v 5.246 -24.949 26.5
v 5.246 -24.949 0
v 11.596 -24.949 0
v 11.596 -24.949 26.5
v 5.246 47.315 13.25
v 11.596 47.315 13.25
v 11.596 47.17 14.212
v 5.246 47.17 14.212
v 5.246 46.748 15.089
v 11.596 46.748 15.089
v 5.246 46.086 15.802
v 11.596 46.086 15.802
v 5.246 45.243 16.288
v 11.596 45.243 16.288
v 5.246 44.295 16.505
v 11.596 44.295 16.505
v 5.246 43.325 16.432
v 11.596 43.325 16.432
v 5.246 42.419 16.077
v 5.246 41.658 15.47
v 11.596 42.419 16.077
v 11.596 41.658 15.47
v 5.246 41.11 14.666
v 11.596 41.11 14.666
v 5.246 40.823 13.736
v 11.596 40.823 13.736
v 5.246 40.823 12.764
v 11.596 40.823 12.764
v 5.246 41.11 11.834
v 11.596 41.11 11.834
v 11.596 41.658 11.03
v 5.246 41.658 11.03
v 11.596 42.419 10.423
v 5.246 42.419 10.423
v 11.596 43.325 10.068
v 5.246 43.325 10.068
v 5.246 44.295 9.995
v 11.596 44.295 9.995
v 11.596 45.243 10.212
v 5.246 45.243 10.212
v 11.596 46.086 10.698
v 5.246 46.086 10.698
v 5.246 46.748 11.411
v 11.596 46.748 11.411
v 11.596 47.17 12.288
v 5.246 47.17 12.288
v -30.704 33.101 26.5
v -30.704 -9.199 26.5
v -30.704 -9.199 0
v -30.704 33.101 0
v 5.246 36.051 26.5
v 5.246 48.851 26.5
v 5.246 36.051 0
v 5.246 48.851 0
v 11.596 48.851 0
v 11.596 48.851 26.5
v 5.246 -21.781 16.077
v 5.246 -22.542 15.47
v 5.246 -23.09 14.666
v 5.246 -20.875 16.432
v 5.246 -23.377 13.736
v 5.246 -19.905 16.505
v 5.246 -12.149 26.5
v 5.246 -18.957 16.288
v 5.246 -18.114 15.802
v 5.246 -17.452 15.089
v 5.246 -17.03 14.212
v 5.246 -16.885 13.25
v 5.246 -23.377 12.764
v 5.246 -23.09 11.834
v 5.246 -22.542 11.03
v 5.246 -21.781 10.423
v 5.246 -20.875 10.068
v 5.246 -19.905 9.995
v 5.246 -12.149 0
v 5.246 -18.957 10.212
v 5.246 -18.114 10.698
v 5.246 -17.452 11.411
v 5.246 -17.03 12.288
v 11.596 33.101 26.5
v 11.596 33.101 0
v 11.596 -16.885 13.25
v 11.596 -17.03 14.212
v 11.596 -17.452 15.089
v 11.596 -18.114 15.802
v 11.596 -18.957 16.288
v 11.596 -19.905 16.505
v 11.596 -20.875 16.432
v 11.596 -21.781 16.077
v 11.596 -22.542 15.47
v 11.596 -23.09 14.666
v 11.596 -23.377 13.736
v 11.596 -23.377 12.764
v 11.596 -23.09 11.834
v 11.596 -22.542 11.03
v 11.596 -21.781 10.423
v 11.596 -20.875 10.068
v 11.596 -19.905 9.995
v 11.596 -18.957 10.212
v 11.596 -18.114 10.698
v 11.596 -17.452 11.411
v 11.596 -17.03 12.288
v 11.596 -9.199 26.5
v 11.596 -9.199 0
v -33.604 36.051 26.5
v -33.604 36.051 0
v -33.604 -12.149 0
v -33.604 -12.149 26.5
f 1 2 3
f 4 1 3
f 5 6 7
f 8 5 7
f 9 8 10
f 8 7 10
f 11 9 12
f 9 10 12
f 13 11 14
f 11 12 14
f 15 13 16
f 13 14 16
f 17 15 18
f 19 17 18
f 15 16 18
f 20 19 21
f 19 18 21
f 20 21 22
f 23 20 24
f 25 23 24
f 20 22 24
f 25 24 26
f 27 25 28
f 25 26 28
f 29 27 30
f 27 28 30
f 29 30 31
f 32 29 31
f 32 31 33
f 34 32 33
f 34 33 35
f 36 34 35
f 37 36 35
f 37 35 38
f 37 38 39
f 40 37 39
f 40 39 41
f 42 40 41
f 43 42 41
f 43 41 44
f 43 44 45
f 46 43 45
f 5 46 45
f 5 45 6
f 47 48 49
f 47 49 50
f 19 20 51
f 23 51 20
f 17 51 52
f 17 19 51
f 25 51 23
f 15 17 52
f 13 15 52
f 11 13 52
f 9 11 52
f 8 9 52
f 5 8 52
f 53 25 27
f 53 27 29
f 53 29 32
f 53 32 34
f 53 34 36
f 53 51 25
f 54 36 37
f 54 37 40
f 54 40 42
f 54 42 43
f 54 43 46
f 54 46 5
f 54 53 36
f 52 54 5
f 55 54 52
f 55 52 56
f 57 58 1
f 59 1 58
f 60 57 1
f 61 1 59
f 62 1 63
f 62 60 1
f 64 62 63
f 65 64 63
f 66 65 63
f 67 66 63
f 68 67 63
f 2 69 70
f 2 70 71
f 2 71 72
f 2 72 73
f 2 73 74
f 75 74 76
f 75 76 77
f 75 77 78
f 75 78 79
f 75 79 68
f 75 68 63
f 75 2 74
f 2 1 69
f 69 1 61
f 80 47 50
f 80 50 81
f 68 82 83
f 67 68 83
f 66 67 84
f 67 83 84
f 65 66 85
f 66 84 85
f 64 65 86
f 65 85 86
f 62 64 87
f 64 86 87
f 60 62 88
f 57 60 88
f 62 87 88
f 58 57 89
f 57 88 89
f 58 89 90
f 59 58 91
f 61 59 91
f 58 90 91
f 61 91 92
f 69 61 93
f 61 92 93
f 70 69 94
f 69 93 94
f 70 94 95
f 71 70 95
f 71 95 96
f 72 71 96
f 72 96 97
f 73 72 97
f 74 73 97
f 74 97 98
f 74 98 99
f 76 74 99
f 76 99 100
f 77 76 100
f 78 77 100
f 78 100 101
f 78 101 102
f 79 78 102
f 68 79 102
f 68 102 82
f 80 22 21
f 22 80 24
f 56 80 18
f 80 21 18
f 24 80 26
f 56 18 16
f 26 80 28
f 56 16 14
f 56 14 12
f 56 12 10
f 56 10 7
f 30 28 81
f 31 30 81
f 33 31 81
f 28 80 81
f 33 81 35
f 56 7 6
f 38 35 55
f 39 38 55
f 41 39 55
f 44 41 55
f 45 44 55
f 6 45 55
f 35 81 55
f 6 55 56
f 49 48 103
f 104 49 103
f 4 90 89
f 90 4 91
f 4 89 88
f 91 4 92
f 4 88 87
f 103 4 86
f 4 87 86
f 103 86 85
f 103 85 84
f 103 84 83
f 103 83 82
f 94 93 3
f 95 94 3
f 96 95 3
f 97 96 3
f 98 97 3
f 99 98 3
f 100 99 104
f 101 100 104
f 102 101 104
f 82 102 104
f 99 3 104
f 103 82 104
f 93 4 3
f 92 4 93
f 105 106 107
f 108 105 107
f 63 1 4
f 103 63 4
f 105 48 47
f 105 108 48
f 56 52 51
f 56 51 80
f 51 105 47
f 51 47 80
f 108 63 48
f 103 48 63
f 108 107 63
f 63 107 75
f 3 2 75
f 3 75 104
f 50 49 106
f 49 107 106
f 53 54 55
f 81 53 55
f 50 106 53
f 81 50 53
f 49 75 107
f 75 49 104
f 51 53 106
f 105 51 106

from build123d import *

# Parameters (mm, degrees)
F0_W     = 6.35
F0_H     = 12.8
F1_DEPTH = 26.5
F3_D     = 6.528
F4_W     = 42.3
F4_H     = 42.3
F5_DEPTH = 26.5


with BuildPart() as f1:
    # F0 (on Top) → F1 (new body)
    with BuildSketch(Plane.XY):
        Polygon((5.245822, 36.050879), (-33.604178, 36.050879), (-33.604178, -12.149121), (5.245822, -12.149121), (11.595822, -12.149121), (11.595822, 36.050879), align=None)
        with Locations((8.420822, 42.450879)):
            Rectangle(F0_W, F0_H)
        with Locations((8.420822, -18.549121)):
            Rectangle(F0_W, F0_H)
    extrude(amount=F1_DEPTH)

    # F3 (through all)
    with Locations(Plane(origin=(5.245822, 0, 0), x_dir=(0, -1, 0), z_dir=(-1, 0, 0))):
        with Locations((-44.050879, 13.25), (20.149121, 13.25)):
            Hole(F3_D / 2)

    # F4 (on face) → F5 (cut, through all)
    with BuildSketch(Plane.XY.offset(26.5)):
        with Locations((-9.554178, 11.950879)):
            Rectangle(F4_W, F4_H)
    extrude(amount=-F5_DEPTH, mode=Mode.SUBTRACT)


solid = f1.part
